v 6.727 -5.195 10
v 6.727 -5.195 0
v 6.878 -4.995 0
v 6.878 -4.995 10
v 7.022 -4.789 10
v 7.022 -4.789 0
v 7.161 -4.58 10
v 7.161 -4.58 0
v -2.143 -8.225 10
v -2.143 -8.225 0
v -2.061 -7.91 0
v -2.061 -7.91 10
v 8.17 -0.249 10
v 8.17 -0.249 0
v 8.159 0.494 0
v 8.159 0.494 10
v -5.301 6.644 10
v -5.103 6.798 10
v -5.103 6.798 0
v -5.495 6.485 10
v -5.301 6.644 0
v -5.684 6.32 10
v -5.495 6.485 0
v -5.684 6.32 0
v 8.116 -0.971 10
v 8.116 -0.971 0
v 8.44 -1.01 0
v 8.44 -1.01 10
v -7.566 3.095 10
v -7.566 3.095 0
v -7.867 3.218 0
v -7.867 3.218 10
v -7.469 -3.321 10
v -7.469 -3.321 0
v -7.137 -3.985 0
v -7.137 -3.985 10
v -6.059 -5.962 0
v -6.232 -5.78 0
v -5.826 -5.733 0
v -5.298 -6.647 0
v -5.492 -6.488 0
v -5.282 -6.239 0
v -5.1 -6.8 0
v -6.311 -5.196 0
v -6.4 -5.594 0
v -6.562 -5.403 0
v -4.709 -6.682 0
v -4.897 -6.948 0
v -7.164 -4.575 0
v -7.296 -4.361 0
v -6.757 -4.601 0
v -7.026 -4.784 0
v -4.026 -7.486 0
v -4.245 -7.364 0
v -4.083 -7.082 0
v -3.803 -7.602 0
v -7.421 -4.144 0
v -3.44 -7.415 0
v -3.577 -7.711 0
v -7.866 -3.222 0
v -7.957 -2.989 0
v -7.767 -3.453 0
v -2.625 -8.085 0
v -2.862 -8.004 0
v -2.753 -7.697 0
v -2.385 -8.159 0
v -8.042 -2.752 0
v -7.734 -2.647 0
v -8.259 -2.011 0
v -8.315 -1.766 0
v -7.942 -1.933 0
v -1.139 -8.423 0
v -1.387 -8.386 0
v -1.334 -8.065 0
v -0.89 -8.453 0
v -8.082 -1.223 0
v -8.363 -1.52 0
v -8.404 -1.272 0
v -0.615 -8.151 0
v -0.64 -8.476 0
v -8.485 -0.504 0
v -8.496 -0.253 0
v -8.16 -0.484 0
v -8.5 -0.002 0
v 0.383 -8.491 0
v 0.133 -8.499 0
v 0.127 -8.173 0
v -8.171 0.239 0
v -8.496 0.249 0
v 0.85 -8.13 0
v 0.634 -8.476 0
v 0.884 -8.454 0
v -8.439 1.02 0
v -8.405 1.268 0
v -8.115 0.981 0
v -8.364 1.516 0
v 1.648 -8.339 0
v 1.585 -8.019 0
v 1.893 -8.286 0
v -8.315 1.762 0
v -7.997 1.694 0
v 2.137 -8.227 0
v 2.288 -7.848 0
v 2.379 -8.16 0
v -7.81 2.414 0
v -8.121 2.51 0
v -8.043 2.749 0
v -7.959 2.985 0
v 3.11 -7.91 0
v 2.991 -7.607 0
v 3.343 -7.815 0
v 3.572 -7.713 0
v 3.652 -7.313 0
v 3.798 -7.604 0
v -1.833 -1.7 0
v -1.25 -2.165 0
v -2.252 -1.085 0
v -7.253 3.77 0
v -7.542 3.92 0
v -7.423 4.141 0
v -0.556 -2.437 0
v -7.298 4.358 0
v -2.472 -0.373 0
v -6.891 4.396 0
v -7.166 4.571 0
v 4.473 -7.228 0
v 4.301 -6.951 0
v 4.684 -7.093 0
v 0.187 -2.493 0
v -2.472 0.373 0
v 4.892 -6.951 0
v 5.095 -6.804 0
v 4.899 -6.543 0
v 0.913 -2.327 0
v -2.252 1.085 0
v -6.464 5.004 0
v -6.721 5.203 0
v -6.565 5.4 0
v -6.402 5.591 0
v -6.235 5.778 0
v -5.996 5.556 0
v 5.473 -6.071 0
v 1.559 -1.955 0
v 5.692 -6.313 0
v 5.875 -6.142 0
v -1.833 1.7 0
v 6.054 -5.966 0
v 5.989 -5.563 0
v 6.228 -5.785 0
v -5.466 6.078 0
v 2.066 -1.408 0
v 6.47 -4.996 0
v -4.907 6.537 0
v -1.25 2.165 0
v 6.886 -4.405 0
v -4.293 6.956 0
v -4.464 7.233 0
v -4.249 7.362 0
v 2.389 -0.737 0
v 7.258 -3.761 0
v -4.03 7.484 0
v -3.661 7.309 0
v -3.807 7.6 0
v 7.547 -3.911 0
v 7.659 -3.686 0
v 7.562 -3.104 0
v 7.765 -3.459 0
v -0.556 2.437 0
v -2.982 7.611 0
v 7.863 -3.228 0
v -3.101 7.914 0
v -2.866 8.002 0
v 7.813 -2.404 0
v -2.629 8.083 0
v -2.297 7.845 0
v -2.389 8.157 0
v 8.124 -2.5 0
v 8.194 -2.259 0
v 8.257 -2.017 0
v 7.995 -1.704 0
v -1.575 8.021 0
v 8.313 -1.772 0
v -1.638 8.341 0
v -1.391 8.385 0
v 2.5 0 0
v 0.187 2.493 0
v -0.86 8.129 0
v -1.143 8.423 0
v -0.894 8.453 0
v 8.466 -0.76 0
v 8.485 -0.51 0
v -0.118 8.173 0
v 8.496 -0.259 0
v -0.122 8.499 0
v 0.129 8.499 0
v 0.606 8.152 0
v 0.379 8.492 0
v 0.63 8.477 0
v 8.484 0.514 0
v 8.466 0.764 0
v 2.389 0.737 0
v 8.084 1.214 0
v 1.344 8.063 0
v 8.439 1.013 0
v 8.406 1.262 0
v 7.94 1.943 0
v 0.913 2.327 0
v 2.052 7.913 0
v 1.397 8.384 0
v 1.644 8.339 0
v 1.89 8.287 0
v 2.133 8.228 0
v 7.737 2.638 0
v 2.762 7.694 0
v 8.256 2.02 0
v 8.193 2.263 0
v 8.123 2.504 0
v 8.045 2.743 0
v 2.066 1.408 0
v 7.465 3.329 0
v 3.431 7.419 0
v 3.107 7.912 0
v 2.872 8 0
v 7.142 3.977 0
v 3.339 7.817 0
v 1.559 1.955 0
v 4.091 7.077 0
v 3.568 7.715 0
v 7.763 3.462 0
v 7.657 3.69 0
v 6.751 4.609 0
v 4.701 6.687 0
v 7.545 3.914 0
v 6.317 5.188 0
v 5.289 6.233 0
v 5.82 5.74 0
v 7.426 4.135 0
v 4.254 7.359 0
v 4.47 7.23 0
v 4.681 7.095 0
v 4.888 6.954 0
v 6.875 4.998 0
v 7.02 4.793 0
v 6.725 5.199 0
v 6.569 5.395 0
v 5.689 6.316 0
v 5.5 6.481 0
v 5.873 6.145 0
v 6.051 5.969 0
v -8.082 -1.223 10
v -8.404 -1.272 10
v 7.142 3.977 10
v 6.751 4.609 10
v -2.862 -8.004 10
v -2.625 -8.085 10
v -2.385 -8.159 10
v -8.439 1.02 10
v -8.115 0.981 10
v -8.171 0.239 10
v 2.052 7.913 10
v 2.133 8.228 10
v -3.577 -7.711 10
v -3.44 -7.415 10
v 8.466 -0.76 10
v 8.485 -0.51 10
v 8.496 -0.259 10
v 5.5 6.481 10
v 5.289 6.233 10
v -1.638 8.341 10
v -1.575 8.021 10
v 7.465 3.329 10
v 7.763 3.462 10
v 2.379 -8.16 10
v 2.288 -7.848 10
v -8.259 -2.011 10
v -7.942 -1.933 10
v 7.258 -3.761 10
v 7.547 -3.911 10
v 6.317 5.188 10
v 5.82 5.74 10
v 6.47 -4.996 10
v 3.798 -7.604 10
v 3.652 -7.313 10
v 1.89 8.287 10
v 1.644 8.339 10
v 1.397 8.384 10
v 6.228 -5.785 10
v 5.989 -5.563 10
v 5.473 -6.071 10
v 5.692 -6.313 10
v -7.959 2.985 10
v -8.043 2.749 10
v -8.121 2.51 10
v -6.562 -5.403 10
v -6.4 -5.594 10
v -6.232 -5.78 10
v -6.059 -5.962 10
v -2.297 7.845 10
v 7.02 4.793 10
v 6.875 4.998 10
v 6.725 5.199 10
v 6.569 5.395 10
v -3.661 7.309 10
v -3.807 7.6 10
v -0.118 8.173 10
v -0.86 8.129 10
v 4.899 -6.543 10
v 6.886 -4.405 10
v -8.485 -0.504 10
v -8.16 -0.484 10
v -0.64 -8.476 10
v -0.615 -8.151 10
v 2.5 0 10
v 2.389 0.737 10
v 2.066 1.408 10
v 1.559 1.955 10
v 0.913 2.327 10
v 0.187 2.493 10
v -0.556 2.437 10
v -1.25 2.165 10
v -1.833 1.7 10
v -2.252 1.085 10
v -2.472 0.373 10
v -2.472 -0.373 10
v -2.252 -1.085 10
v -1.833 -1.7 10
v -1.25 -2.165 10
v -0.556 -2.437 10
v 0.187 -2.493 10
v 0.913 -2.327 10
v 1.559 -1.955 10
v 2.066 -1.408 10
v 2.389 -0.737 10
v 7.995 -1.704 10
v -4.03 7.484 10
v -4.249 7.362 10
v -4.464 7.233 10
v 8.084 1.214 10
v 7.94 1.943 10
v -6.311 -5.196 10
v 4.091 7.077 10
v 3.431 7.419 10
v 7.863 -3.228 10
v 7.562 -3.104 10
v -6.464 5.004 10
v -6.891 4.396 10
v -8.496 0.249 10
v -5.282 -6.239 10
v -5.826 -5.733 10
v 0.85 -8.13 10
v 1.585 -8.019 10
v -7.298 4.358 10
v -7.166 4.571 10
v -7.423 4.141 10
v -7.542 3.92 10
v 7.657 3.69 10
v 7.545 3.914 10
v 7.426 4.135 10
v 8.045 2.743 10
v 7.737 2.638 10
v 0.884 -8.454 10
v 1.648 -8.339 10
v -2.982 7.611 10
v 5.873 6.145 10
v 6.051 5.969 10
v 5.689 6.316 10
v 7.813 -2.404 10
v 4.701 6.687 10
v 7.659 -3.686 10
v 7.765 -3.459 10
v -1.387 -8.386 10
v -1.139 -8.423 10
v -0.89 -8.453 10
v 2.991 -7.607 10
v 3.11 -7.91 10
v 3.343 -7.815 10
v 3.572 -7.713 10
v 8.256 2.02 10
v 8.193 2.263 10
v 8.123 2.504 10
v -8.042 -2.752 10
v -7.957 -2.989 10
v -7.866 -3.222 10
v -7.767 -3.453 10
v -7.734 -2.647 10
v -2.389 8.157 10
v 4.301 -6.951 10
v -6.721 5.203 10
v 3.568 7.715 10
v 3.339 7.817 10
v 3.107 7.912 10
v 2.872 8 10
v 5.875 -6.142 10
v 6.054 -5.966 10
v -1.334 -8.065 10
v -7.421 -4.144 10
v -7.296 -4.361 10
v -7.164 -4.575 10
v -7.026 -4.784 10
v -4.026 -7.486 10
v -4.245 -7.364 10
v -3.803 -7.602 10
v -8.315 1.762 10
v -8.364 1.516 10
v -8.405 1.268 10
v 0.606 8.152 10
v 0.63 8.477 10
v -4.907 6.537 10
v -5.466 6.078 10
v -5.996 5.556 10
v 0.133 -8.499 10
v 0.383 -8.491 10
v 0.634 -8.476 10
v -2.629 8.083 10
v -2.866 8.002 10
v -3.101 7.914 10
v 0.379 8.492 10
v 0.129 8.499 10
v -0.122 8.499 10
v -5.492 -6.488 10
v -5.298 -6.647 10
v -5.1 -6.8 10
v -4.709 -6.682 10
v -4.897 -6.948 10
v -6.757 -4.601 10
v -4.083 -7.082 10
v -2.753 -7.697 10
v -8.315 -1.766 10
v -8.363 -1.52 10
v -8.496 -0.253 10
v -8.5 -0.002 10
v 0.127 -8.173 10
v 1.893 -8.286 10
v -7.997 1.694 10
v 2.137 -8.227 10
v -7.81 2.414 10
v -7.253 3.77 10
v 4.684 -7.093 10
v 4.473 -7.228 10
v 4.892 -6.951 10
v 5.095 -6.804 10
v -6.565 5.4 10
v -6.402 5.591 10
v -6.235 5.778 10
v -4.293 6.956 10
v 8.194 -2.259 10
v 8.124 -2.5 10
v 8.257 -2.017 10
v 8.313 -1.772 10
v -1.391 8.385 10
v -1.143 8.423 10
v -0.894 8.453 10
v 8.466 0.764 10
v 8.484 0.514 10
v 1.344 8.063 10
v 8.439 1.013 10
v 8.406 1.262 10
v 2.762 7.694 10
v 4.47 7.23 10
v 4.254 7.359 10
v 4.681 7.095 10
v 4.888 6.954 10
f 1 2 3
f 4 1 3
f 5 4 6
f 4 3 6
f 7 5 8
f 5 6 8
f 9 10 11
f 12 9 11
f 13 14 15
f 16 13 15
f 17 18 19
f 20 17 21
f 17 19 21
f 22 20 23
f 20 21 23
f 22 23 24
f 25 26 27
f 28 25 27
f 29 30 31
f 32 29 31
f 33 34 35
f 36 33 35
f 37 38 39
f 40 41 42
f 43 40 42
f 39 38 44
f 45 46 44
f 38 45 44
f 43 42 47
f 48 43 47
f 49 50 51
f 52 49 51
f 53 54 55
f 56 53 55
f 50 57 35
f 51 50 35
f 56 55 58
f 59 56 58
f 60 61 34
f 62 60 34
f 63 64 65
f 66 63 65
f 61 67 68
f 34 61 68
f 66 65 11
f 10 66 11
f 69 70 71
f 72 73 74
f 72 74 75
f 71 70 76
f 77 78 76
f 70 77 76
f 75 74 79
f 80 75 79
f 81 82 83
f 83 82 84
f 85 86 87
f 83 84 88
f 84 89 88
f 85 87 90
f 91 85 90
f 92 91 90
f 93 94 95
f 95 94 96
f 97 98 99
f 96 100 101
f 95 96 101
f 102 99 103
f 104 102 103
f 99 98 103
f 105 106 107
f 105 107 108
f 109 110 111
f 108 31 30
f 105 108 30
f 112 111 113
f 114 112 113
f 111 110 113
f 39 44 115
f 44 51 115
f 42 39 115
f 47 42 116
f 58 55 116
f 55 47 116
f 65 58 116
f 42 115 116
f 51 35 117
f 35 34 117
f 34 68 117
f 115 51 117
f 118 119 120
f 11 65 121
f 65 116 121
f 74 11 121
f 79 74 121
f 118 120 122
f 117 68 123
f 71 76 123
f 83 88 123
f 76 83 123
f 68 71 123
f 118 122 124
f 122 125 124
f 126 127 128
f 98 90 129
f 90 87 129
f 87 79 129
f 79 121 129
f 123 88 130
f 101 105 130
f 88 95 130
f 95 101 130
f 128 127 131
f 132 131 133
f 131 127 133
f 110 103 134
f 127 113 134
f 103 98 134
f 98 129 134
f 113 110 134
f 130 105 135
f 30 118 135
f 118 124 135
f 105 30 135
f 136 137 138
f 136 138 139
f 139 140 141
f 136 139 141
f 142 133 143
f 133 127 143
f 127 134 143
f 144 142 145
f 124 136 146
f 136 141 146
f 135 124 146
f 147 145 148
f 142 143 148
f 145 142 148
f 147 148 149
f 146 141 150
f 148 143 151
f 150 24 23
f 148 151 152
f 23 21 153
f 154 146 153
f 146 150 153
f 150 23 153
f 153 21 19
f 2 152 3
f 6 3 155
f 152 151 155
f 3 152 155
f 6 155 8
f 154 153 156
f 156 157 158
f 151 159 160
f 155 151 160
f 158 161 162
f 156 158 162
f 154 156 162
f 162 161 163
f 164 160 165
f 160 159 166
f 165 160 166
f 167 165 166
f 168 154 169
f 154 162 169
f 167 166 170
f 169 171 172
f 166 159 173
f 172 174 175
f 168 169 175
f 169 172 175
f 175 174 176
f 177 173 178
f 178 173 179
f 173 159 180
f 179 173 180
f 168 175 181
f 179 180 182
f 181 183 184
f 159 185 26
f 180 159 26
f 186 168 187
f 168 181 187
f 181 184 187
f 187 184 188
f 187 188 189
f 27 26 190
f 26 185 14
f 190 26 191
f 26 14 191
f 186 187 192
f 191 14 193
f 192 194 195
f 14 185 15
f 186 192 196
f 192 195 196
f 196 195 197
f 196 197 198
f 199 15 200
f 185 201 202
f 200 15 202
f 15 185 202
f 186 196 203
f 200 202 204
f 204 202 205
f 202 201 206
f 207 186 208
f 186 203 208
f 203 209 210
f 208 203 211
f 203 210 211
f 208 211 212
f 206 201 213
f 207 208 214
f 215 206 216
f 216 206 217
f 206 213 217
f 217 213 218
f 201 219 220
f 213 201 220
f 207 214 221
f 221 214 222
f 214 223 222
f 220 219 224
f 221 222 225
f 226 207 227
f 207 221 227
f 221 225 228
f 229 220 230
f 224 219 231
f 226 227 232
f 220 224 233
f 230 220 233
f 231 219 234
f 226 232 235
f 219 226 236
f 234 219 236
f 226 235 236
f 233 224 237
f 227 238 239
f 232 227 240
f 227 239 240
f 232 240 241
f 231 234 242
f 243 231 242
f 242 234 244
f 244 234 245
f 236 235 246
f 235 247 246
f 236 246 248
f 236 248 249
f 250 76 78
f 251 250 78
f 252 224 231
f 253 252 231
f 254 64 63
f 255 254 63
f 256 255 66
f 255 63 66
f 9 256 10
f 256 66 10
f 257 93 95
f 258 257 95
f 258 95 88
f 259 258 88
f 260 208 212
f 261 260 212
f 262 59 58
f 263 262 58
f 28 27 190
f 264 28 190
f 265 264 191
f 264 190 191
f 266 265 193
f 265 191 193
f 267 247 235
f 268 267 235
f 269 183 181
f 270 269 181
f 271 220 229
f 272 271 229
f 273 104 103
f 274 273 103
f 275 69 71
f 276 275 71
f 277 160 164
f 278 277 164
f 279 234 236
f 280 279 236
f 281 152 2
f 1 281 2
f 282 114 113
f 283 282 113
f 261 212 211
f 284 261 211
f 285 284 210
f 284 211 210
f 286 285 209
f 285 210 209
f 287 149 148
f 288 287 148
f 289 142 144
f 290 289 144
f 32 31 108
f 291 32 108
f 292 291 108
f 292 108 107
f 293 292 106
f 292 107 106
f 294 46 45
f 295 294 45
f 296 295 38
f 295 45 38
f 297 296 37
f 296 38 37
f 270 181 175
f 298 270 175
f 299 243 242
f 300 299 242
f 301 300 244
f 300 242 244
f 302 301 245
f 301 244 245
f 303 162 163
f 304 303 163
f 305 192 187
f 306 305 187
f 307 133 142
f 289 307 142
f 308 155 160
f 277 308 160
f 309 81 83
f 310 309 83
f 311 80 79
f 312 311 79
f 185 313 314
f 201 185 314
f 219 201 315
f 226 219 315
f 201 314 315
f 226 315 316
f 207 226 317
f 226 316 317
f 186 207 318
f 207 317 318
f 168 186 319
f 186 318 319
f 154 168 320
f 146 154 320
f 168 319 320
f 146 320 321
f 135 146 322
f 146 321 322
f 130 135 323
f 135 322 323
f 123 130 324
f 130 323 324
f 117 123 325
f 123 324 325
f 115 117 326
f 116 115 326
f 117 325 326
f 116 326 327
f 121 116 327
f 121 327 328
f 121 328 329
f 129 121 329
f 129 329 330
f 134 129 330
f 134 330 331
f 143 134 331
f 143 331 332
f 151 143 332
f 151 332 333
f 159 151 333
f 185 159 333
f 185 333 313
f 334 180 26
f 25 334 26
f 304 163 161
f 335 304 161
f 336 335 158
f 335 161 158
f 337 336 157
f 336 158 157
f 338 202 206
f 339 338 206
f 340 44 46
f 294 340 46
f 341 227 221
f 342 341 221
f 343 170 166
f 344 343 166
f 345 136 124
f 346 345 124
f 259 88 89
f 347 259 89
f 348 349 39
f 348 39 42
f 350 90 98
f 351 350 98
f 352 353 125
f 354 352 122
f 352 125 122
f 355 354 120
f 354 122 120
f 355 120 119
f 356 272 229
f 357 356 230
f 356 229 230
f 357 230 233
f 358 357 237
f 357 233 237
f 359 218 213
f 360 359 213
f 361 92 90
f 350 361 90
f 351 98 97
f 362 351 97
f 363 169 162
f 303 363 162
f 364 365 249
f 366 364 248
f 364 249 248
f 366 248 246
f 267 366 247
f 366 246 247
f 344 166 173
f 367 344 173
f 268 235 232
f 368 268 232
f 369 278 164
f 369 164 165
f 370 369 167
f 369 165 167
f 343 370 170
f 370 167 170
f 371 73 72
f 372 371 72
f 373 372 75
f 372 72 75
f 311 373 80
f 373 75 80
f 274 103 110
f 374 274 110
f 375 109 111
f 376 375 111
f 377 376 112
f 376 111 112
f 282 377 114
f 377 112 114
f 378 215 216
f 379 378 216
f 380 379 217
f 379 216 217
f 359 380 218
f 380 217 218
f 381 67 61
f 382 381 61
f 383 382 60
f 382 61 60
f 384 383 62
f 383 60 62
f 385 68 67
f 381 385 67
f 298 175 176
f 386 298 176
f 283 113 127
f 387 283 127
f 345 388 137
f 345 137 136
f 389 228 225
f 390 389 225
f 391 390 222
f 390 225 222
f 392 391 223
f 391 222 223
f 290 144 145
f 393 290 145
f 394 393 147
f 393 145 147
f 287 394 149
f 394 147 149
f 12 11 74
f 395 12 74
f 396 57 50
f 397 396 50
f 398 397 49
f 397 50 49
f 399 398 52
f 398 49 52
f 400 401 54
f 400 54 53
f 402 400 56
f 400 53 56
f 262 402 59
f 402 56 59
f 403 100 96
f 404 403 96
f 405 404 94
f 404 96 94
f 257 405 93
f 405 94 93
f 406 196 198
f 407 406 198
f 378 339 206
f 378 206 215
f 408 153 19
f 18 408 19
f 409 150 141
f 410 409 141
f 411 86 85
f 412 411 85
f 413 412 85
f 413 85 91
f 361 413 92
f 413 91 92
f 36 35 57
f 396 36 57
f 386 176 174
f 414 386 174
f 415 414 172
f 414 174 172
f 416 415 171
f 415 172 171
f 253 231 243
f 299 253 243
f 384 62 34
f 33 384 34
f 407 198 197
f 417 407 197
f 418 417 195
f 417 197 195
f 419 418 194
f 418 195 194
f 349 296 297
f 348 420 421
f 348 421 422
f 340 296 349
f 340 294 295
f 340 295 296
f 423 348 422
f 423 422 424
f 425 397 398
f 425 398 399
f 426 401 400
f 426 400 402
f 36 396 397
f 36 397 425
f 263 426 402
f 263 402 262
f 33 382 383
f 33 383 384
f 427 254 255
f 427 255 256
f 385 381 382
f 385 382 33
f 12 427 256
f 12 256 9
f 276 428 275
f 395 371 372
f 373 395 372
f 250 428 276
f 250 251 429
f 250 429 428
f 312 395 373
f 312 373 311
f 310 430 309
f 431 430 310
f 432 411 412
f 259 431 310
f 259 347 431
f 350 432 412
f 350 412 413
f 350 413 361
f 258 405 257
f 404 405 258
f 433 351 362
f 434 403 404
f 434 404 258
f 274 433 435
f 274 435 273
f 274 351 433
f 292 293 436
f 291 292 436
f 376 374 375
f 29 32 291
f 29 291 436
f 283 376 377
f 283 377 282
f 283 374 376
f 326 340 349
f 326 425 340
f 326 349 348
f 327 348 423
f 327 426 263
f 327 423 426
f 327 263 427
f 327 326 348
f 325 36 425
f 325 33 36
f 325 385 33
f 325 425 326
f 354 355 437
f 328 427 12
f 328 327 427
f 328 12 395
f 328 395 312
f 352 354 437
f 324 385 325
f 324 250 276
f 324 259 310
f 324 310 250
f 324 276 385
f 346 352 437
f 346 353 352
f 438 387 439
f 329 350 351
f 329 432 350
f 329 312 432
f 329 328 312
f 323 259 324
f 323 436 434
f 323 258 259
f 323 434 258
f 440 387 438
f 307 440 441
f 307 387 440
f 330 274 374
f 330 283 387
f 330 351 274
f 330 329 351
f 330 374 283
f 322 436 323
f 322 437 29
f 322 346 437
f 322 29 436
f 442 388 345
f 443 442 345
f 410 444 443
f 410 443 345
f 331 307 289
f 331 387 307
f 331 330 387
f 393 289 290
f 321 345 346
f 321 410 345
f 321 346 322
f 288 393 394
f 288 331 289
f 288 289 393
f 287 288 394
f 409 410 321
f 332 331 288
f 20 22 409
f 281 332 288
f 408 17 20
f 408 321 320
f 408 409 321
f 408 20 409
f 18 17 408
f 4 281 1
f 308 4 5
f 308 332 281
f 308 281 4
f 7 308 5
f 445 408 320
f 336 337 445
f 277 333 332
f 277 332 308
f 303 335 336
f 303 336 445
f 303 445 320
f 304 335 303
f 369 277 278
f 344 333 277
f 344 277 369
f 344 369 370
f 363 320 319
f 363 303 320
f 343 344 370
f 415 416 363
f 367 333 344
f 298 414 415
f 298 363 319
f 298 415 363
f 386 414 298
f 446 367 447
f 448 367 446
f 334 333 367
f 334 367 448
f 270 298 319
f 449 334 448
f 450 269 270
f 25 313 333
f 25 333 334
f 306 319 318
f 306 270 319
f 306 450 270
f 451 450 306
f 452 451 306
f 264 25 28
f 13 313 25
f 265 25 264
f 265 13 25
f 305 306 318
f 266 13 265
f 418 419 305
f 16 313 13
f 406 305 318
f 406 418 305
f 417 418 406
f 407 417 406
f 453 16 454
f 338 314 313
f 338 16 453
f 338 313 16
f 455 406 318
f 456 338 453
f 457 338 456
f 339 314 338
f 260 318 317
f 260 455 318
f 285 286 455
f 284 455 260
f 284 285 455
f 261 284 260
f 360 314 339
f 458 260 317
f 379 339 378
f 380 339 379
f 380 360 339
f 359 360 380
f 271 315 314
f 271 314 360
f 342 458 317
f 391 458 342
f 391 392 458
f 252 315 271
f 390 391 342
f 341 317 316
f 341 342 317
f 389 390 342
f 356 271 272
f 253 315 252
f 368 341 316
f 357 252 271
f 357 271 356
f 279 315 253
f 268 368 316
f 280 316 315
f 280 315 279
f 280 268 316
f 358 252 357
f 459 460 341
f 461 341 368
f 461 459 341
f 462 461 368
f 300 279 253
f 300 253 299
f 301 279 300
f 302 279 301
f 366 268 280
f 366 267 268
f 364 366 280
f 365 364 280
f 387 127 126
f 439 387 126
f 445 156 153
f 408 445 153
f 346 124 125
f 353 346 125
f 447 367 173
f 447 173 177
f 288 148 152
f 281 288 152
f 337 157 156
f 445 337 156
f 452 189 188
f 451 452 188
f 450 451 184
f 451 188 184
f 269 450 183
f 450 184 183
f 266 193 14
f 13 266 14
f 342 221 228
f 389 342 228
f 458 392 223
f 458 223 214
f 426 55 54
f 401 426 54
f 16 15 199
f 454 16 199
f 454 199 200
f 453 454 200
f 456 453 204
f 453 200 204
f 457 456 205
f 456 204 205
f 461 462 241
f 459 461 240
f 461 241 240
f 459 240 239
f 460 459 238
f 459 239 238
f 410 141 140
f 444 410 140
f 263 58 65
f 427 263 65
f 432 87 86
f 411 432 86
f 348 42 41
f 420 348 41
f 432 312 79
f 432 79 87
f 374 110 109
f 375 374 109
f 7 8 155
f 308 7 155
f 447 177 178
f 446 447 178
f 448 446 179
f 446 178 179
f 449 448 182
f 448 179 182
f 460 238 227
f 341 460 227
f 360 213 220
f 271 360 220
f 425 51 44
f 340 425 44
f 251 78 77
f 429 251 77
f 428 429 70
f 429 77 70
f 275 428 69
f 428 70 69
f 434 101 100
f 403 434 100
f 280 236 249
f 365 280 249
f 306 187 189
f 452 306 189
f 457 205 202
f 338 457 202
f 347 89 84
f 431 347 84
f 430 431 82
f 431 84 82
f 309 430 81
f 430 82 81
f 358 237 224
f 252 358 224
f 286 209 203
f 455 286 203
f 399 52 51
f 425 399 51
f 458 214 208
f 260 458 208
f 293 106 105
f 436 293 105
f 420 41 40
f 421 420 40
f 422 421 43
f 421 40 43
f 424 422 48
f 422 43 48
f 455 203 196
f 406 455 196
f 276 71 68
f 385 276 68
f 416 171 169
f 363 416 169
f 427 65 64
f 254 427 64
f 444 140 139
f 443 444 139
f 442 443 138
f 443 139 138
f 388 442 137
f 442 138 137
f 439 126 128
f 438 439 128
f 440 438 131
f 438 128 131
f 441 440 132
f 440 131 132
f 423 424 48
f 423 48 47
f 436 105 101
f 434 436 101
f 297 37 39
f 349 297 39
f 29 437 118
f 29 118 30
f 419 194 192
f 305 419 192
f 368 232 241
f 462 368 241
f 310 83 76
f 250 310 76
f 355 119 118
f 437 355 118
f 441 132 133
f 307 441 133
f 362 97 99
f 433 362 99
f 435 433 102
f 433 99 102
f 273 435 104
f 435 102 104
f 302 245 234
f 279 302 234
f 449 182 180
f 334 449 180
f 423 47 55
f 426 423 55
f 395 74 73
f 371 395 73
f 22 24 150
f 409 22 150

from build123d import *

# Parameters (mm, degrees)
BOSS_EXTRUDE1_DEPTH = 10
SKETCH2_R           = 2.5
CUT_EXTRUDE1_DEPTH  = 11


with BuildPart() as part:
    # Sketch1 → Boss-Extrude1 (new body)
    with BuildSketch(Plane.XY):
        with BuildLine():
            Line((-2.297240152, 7.844835842), (-2.388779771, 8.157434107))
            ThreePointArc((-2.388779771, 8.157434107), (-2.74754438, 8.043693174), (-3.100922317, 7.914182256))
            Line((-3.100922317, 7.914182256), (-2.982092925, 7.610905563))
            Line((-2.982092925, 7.610905563), (-3.661072086, 7.308578034))
            Line((-3.661072086, 7.308578034), (-3.806957201, 7.599807686))
            ThreePointArc((-3.806957201, 7.599807686), (-4.139647087, 7.423834723), (-4.464221028, 7.233307031))
            Line((-4.464221028, 7.233307031), (-4.293149129, 6.956121926))
            Line((-4.293149129, 6.956121926), (-4.90723415, 6.537416515))
            Line((-4.90723415, 6.537416515), (-5.102775894, 6.797917194))
            ThreePointArc((-5.102775894, 6.797917194), (-5.398698131, 6.565368115), (-5.684036002, 6.319947367))
            Line((-5.684036002, 6.319947367), (-5.466219987, 6.077762808))
            Line((-5.466219987, 6.077762808), (-5.995673672, 5.55613705))
            Line((-5.995673672, 5.55613705), (-6.234587172, 5.777536049))
            ThreePointArc((-6.234587172, 5.777536049), (-6.484230575, 5.495885174), (-6.721161383, 5.203459394))
            Line((-6.721161383, 5.203459394), (-6.463602037, 5.004059392))
            Line((-6.463602037, 5.004059392), (-6.891407308, 4.396278769))
            Line((-6.891407308, 4.396278769), (-7.166013687, 4.571460142))
            ThreePointArc((-7.166013687, 4.571460142), (-7.361354513, 4.249759962), (-7.542263106, 3.919727955))
            Line((-7.542263106, 3.919727955), (-7.2532386, 3.76952139))
            Line((-7.2532386, 3.76952139), (-7.565645443, 3.095120471))
            Line((-7.565645443, 3.095120471), (-7.867118627, 3.218453745))
            ThreePointArc((-7.867118627, 3.218453745), (-8.00187846, 2.867043968), (-8.120950287, 2.510013234))
            Line((-8.120950287, 2.510013234), (-7.809750106, 2.413827869))
            Line((-7.809750106, 2.413827869), (-7.996717508, 1.694482454))
            Line((-7.996717508, 1.694482454), (-8.315367901, 1.762003596))
            ThreePointArc((-8.315367901, 1.762003596), (-8.385215449, 1.392178821), (-8.438623444, 1.019624623))
            Line((-8.438623444, 1.019624623), (-8.115249818, 0.980551934))
            Line((-8.115249818, 0.980551934), (-8.170768494, 0.239382377))
            Line((-8.170768494, 0.239382377), (-8.496354409, 0.248921202))
            ThreePointArc((-8.496354409, 0.248921202), (-8.499044715, -0.127432098), (-8.4850723, -0.503535563))
            Line((-8.4850723, -0.503535563), (-8.159918723, -0.484239747))
            Line((-8.159918723, -0.484239747), (-8.082204256, -1.223411647))
            Line((-8.082204256, -1.223411647), (-8.404261095, -1.272161724))
            ThreePointArc((-8.404261095, -1.272161724), (-8.33970769, -1.642947245), (-8.258803951, -2.010511701))
            Line((-8.258803951, -2.010511701), (-7.942321126, -1.933467564))
            Line((-7.942321126, -1.933467564), (-7.733871324, -2.646884213))
            Line((-7.733871324, -2.646884213), (-8.042047914, -2.752356326))
            ThreePointArc((-8.042047914, -2.752356326), (-7.912325598, -3.105656715), (-7.767090848, -3.452868339))
            Line((-7.767090848, -3.452868339), (-7.469450794, -3.320552143))
            Line((-7.469450794, -3.320552143), (-7.136965404, -3.985283743))
            Line((-7.136965404, -3.985283743), (-7.421356697, -4.144087931))
            ThreePointArc((-7.421356697, -4.144087931), (-7.230634851, -4.468547824), (-7.025737053, -4.784246948))
            Line((-7.025737053, -4.784246948), (-6.756506167, -4.600911443))
            Line((-6.756506167, -4.600911443), (-6.310671544, -5.195592975))
            Line((-6.310671544, -5.195592975), (-6.562136969, -5.40262514))
            ThreePointArc((-6.562136969, -5.40262514), (-6.316545551, -5.687816128), (-6.05857029, -5.961855923))
            Line((-6.05857029, -5.961855923), (-5.826401873, -5.733393665))
            Line((-5.826401873, -5.733393665), (-5.281547508, -6.238911573))
            Line((-5.281547508, -6.238911573), (-5.492004759, -6.487517532))
            ThreePointArc((-5.492004759, -6.487517532), (-5.199437279, -6.724273342), (-4.896676092, -6.947845943))
            Line((-4.896676092, -6.947845943), (-4.709032228, -6.681599896))
            Line((-4.709032228, -6.681599896), (-4.082670189, -7.08170642))
            Line((-4.082670189, -7.08170642), (-4.245354998, -7.363895772))
            ThreePointArc((-4.245354998, -7.363895772), (-3.915214815, -7.544606879), (-3.577398695, -7.710526478))
            Line((-3.577398695, -7.710526478), (-3.440310413, -7.415054009))
            Line((-3.440310413, -7.415054009), (-2.752572491, -7.696889396))
            Line((-2.752572491, -7.696889396), (-2.862256034, -8.003592343))
            ThreePointArc((-2.862256034, -8.003592343), (-2.505154125, -8.122450542), (-2.143140761, -8.225384348))
            Line((-2.143140761, -8.225384348), (-2.061014191, -7.910182185))
            Line((-2.061014191, -7.910182185), (-1.334004849, -8.064688014))
            Line((-1.334004849, -8.064688014), (-1.387161806, -8.386046871))
            ThreePointArc((-1.387161806, -8.386046871), (-1.014575721, -8.439231962), (-0.64000052, -8.475871597))
            Line((-0.64000052, -8.475871597), (-0.615475277, -8.151070597))
            Line((-0.615475277, -8.151070597), (0.127438807, -8.173280923))
            Line((0.127438807, -8.173280923), (0.132516944, -8.498966952))
            ThreePointArc((0.132516944, -8.498966952), (0.508611982, -8.484769523), (0.883709865, -8.453937359))
            Line((0.883709865, -8.453937359), (0.849845519, -8.129976894))
            Line((0.849845519, -8.129976894), (1.584786475, -8.019177858))
            Line((1.584786475, -8.019177858), (1.64793649, -8.338723243))
            ThreePointArc((1.64793649, -8.338723243), (2.015452477, -8.25759961), (2.379017088, -8.160286619))
            Line((2.379017088, -8.160286619), (2.287851581, -7.847579043))
            Line((2.287851581, -7.847579043), (2.991197802, -7.607331819))
            Line((2.991197802, -7.607331819), (3.110390002, -7.910466107))
            ThreePointArc((3.110390002, -7.910466107), (3.457514671, -7.765023651), (3.797860744, -7.604357552))
            Line((3.797860744, -7.604357552), (3.65232421, -7.312953546))
            Line((3.65232421, -7.312953546), (4.30146957, -6.950979876))
            Line((4.30146957, -6.950979876), (4.47287302, -7.227960082))
            ThreePointArc((4.47287302, -7.227960082), (4.788449499, -7.022873443), (5.09463803, -6.804018176))
            Line((5.09463803, -6.804018176), (4.899408135, -6.543283704))
            Line((4.899408135, -6.543283704), (5.473488567, -6.07121772))
            Line((5.473488567, -6.07121772), (5.691594218, -6.313141473))
            ThreePointArc((5.691594218, -6.313141473), (5.96547962, -6.055002304), (6.227669459, -5.784992058))
            Line((6.227669459, -5.784992058), (5.98902105, -5.56330734))
            Line((5.98902105, -5.56330734), (6.469585137, -4.996321632))
            Line((6.469585137, -4.996321632), (6.727382895, -5.195413302))
            ThreePointArc((6.727382895, -5.195413302), (6.950774318, -4.892518409), (7.160538467, -4.580031535))
            Line((7.160538467, -4.580031535), (6.886141901, -4.4045217))
            Line((6.886141901, -4.4045217), (7.257743919, -3.760839655))
            Line((7.257743919, -3.760839655), (7.546947951, -3.910700273))
            ThreePointArc((7.546947951, -3.910700273), (7.71266541, -3.572784946), (7.863261877, -3.22786503))
            Line((7.863261877, -3.22786503), (7.561936486, -3.10417111))
            Line((7.561936486, -3.10417111), (7.812632839, -2.404481197))
            Line((7.812632839, -2.404481197), (8.12394789, -2.50029412))
            ThreePointArc((8.12394789, -2.50029412), (8.22666509, -2.138219236), (8.31325358, -1.771952288))
            Line((8.31325358, -1.771952288), (7.99468421, -1.704049905))
            Line((7.99468421, -1.704049905), (8.116417311, -0.970840735))
            Line((8.116417311, -0.970840735), (8.439837459, -1.009526456))
            ThreePointArc((8.439837459, -1.009526456), (8.476252984, -0.634929401), (8.496050473, -0.259087541))
            Line((8.496050473, -0.259087541), (8.170476205, -0.249159135))
            Line((8.170476205, -0.249159135), (8.159333453, 0.494003347))
            Line((8.159333453, 0.494003347), (8.484463708, 0.513688219))
            ThreePointArc((8.484463708, 0.513688219), (8.453407134, 0.888767589), (8.405777314, 1.262104493))
            Line((8.405777314, 1.262104493), (8.083662373, 1.213739815))
            Line((8.083662373, 1.213739815), (7.940001904, 1.942969755))
            Line((7.940001904, 1.942969755), (8.256392313, 2.020392532))
            ThreePointArc((8.256392313, 2.020392532), (8.158861823, 2.383898856), (8.045335555, 2.74273145))
            Line((8.045335555, 2.74273145), (7.73703298, 2.637628169))
            Line((7.73703298, 2.637628169), (7.46547216, 3.329487516))
            Line((7.46547216, 3.329487516), (7.762953675, 3.462159766))
            ThreePointArc((7.762953675, 3.462159766), (7.60208398, 3.802409653), (7.426310092, 4.135204762))
            Line((7.426310092, 4.135204762), (7.141728982, 3.976740983))
            Line((7.141728982, 3.976740983), (6.750995999, 4.608992809))
            Line((6.750995999, 4.608992809), (7.020007318, 4.792650337))
            ThreePointArc((7.020007318, 4.792650337), (6.800968902, 5.098707875), (6.568596912, 5.39476919))
            Line((6.568596912, 5.39476919), (6.316883938, 5.18803807))
            Line((6.316883938, 5.18803807), (5.819537272, 5.740361281))
            Line((5.819537272, 5.740361281), (6.051432151, 5.969101182))
            ThreePointArc((6.051432151, 5.969101182), (5.781265088, 6.23112943), (5.499763622, 6.480941297))
            Line((5.499763622, 6.480941297), (5.289009046, 6.232587345))
            Line((5.289009046, 6.232587345), (4.701033829, 6.687229818))
            Line((4.701033829, 6.687229818), (4.888358974, 6.953700205))
            ThreePointArc((4.888358974, 6.953700205), (4.575746658, 7.163277359), (4.254163405, 7.358810619))
            Line((4.254163405, 7.358810619), (4.091141052, 7.076816134))
            Line((4.091141052, 7.076816134), (3.43143529, 7.419165287))
            Line((3.43143529, 7.419165287), (3.568169919, 7.714801581))
            ThreePointArc((3.568169919, 7.714801581), (3.223159965, 7.86519166), (2.871830875, 8.000161712))
            Line((2.871830875, 8.000161712), (2.761780418, 7.693590229))
            Line((2.761780418, 7.693590229), (2.051547597, 7.912642678))
            Line((2.051547597, 7.912642678), (2.133296946, 8.227942886))
            ThreePointArc((2.133296946, 8.227942886), (1.766978258, 8.314312229), (1.397195338, 8.384381026))
            Line((1.397195338, 8.384381026), (1.34365389, 8.063086005))
            Line((1.34365389, 8.063086005), (0.605721477, 8.151801224))
            Line((0.605721477, 8.151801224), (0.629858054, 8.476631337))
            ThreePointArc((0.629858054, 8.476631337), (0.254004417, 8.496203962), (-0.122347206, 8.499119434))
            Line((-0.122347206, 8.499119434), (-0.117658781, 8.173427562))
            Line((-0.117658781, 8.173427562), (-0.85957303, 8.12895417))
            Line((-0.85957303, 8.12895417), (-0.893824994, 8.452873883))
            ThreePointArc((-0.893824994, 8.452873883), (-1.267133336, 8.405020708), (-1.637957411, 8.340689151))
            Line((-1.637957411, 8.340689151), (-1.575189801, 8.021068432))
            Line((-1.575189801, 8.021068432), (-2.297240152, 7.844835842))
        make_face()
    extrude(amount=BOSS_EXTRUDE1_DEPTH)

    # Sketch2 → Cut-Extrude1 (cut, through all)
    with BuildSketch(Plane.XY.offset(10)):
        Circle(SKETCH2_R)
    extrude(amount=-CUT_EXTRUDE1_DEPTH, mode=Mode.SUBTRACT)


solid = part.part
